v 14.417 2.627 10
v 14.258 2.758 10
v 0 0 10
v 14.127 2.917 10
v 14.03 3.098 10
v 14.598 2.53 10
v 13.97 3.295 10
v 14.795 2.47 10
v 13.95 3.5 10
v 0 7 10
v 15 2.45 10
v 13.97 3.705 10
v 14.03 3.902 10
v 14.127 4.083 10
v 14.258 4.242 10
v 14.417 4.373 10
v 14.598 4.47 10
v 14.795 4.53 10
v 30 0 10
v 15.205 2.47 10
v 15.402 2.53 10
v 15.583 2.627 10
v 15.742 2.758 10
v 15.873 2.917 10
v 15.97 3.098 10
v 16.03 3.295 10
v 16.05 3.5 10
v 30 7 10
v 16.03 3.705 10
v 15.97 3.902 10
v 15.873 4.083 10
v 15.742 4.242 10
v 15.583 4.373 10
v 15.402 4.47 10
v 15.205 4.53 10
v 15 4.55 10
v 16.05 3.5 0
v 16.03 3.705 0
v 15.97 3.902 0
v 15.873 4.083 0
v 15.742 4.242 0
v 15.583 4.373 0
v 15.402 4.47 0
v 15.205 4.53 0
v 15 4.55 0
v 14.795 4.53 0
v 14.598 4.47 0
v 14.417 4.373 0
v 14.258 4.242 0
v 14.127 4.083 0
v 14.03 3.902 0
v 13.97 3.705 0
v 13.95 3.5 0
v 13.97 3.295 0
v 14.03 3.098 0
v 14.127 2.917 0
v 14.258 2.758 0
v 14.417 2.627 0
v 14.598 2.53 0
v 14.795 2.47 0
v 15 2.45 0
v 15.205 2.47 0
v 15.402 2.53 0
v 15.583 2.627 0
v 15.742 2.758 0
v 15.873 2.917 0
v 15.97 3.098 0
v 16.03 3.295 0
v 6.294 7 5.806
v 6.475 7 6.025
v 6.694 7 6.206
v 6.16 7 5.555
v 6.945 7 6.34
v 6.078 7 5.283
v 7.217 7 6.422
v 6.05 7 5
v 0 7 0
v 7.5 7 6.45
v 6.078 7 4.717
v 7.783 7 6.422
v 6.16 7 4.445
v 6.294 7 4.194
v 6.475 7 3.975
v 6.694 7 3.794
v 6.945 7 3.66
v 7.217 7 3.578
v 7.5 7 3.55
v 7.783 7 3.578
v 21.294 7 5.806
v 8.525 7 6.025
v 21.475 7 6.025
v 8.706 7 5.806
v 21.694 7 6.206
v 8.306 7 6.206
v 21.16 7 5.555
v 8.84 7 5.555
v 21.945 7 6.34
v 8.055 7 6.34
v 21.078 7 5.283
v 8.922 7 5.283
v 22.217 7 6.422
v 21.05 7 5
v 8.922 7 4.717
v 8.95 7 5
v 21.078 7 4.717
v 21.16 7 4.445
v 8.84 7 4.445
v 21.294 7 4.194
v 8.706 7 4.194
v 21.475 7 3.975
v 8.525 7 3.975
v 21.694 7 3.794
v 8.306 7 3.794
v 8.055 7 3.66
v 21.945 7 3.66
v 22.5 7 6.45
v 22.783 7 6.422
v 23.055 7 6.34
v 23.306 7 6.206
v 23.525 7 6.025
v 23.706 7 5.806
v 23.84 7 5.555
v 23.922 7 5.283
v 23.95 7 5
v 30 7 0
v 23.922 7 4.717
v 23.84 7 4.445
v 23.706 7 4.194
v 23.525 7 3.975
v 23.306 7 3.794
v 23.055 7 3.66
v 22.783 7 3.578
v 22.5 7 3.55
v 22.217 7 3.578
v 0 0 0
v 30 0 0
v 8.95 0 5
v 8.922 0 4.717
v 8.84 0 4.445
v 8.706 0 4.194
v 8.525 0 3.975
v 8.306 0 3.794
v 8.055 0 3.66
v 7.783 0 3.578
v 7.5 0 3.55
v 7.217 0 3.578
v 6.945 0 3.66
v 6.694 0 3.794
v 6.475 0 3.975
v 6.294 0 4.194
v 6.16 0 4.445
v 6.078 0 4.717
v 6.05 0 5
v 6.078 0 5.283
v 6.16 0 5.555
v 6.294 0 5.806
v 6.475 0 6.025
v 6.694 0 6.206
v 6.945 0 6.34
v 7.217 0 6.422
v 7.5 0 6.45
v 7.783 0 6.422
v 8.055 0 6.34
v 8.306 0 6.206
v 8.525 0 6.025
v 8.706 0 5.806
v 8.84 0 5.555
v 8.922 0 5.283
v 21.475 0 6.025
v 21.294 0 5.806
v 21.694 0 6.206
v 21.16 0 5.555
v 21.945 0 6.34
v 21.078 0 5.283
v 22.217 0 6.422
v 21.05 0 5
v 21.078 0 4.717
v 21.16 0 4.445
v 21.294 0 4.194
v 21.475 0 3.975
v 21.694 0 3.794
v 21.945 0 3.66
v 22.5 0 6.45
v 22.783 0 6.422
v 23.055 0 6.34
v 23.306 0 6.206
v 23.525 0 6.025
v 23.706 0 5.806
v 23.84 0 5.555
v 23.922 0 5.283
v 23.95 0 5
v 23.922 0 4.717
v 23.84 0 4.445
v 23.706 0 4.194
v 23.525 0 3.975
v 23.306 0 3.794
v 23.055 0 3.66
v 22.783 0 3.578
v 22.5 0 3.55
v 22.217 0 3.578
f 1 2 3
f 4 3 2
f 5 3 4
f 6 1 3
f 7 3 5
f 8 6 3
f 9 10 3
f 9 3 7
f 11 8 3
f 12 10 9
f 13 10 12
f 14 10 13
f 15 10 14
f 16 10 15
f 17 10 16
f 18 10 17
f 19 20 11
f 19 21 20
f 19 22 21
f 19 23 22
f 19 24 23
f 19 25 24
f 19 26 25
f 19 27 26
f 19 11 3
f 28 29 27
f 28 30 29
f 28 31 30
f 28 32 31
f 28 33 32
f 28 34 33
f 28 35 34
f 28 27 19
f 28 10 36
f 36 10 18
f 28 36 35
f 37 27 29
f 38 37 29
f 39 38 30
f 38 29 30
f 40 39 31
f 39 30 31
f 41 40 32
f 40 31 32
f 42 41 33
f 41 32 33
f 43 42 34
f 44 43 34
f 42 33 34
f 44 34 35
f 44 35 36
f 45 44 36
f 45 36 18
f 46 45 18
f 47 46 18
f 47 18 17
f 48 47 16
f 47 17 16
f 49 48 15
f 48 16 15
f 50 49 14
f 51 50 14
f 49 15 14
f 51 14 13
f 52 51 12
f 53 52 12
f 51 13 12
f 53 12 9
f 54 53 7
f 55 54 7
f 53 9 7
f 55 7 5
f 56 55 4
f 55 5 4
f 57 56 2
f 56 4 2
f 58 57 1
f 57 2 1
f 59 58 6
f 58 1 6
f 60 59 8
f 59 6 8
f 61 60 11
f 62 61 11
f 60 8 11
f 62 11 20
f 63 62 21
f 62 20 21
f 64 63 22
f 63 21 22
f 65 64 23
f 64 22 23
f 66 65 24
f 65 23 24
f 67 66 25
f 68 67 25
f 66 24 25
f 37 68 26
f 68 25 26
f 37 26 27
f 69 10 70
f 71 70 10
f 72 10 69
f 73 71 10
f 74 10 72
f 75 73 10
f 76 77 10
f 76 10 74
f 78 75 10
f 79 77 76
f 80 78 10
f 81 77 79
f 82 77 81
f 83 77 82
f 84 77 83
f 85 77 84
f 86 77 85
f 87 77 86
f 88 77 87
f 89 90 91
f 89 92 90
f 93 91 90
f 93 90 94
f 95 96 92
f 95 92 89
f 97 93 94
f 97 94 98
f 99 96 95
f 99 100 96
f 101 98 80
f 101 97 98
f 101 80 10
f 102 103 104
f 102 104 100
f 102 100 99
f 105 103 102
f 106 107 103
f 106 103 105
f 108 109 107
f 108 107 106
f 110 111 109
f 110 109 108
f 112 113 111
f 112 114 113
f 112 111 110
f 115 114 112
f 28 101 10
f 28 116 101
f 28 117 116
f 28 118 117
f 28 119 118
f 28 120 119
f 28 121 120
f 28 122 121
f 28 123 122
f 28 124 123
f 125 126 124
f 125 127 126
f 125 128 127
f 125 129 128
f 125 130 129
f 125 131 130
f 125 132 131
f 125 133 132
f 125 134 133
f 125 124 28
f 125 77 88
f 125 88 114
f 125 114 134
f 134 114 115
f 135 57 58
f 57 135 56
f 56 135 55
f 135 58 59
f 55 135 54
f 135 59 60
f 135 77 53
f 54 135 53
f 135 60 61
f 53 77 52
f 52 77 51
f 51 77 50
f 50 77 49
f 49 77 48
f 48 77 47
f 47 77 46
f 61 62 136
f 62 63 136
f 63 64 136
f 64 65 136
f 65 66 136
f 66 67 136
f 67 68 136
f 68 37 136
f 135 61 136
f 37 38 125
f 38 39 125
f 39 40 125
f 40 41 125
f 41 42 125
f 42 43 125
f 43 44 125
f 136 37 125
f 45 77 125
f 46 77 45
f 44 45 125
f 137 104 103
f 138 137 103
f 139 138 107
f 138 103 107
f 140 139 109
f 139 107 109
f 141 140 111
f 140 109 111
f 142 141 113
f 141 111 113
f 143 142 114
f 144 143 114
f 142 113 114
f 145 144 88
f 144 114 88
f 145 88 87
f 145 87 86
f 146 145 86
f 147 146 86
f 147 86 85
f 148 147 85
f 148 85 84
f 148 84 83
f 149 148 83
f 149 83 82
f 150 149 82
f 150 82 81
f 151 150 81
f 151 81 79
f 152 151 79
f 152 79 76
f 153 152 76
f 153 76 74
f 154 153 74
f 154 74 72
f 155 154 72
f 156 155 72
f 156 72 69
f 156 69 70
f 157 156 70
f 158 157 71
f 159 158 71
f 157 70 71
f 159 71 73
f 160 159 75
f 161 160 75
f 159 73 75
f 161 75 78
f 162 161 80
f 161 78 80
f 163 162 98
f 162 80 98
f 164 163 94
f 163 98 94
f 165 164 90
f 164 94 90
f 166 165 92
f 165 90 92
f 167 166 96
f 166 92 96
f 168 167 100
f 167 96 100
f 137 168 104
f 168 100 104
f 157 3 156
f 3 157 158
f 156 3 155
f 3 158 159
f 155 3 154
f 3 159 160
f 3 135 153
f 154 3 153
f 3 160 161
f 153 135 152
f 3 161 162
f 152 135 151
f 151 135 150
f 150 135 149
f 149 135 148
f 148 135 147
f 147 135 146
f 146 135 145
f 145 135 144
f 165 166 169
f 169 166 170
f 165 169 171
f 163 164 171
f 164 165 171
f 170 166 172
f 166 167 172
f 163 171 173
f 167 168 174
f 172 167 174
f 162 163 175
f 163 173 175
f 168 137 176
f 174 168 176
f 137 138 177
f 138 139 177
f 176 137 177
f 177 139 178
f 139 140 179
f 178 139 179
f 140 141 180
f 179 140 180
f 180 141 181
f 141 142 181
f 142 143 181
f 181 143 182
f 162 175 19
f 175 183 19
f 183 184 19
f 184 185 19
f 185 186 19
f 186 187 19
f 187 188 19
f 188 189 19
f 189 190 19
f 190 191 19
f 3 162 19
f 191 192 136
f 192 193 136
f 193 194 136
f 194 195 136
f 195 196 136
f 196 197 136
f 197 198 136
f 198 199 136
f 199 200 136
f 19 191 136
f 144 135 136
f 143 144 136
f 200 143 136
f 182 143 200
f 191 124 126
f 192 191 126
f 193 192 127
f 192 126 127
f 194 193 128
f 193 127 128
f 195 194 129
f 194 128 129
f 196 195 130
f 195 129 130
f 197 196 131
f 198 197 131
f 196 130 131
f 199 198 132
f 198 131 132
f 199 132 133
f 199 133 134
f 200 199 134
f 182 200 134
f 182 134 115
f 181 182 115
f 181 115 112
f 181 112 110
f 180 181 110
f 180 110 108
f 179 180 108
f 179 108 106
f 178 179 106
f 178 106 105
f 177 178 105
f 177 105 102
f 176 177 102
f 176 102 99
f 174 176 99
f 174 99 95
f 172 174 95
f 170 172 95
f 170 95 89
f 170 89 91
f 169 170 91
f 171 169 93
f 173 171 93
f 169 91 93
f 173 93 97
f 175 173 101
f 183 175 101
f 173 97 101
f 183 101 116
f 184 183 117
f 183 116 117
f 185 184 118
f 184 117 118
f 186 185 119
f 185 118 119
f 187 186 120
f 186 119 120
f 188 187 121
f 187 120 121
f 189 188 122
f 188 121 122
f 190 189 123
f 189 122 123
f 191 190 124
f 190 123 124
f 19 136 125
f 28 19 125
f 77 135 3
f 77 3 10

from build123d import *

# Parameters (mm, degrees)
SKETCH1_W           = 30
SKETCH1_H           = 7
BOSS_EXTRUDE1_DEPTH = 10
SKETCH2_R           = 1.05
CUT_EXTRUDE1_DEPTH  = 10
SKETCH3_R           = 1.45
CUT_EXTRUDE2_DEPTH  = 8


with BuildPart() as part:
    # Sketch1 → Boss-Extrude1 (new body)
    with BuildSketch(Plane.XY):
        with Locations((15, 3.5)):
            Rectangle(SKETCH1_W, SKETCH1_H)
    extrude(amount=BOSS_EXTRUDE1_DEPTH)

    # Sketch2 → Cut-Extrude1 (cut)
    with BuildSketch(Plane.XY.offset(10)):
        with Locations((15, 3.5)):
            Circle(SKETCH2_R)
    extrude(amount=-CUT_EXTRUDE1_DEPTH, mode=Mode.SUBTRACT)

    # Sketch3 → Cut-Extrude2 (cut, through all)
    with BuildSketch(Plane(origin=(0, 7, 0), x_dir=(1, 0, 0), z_dir=(0, 1, 0))):
        with Locations((7.5, -5)):
            Circle(SKETCH3_R)
        with Locations((22.5, -5)):
            Circle(SKETCH3_R)
    extrude(amount=-CUT_EXTRUDE2_DEPTH, mode=Mode.SUBTRACT)


solid = part.part
